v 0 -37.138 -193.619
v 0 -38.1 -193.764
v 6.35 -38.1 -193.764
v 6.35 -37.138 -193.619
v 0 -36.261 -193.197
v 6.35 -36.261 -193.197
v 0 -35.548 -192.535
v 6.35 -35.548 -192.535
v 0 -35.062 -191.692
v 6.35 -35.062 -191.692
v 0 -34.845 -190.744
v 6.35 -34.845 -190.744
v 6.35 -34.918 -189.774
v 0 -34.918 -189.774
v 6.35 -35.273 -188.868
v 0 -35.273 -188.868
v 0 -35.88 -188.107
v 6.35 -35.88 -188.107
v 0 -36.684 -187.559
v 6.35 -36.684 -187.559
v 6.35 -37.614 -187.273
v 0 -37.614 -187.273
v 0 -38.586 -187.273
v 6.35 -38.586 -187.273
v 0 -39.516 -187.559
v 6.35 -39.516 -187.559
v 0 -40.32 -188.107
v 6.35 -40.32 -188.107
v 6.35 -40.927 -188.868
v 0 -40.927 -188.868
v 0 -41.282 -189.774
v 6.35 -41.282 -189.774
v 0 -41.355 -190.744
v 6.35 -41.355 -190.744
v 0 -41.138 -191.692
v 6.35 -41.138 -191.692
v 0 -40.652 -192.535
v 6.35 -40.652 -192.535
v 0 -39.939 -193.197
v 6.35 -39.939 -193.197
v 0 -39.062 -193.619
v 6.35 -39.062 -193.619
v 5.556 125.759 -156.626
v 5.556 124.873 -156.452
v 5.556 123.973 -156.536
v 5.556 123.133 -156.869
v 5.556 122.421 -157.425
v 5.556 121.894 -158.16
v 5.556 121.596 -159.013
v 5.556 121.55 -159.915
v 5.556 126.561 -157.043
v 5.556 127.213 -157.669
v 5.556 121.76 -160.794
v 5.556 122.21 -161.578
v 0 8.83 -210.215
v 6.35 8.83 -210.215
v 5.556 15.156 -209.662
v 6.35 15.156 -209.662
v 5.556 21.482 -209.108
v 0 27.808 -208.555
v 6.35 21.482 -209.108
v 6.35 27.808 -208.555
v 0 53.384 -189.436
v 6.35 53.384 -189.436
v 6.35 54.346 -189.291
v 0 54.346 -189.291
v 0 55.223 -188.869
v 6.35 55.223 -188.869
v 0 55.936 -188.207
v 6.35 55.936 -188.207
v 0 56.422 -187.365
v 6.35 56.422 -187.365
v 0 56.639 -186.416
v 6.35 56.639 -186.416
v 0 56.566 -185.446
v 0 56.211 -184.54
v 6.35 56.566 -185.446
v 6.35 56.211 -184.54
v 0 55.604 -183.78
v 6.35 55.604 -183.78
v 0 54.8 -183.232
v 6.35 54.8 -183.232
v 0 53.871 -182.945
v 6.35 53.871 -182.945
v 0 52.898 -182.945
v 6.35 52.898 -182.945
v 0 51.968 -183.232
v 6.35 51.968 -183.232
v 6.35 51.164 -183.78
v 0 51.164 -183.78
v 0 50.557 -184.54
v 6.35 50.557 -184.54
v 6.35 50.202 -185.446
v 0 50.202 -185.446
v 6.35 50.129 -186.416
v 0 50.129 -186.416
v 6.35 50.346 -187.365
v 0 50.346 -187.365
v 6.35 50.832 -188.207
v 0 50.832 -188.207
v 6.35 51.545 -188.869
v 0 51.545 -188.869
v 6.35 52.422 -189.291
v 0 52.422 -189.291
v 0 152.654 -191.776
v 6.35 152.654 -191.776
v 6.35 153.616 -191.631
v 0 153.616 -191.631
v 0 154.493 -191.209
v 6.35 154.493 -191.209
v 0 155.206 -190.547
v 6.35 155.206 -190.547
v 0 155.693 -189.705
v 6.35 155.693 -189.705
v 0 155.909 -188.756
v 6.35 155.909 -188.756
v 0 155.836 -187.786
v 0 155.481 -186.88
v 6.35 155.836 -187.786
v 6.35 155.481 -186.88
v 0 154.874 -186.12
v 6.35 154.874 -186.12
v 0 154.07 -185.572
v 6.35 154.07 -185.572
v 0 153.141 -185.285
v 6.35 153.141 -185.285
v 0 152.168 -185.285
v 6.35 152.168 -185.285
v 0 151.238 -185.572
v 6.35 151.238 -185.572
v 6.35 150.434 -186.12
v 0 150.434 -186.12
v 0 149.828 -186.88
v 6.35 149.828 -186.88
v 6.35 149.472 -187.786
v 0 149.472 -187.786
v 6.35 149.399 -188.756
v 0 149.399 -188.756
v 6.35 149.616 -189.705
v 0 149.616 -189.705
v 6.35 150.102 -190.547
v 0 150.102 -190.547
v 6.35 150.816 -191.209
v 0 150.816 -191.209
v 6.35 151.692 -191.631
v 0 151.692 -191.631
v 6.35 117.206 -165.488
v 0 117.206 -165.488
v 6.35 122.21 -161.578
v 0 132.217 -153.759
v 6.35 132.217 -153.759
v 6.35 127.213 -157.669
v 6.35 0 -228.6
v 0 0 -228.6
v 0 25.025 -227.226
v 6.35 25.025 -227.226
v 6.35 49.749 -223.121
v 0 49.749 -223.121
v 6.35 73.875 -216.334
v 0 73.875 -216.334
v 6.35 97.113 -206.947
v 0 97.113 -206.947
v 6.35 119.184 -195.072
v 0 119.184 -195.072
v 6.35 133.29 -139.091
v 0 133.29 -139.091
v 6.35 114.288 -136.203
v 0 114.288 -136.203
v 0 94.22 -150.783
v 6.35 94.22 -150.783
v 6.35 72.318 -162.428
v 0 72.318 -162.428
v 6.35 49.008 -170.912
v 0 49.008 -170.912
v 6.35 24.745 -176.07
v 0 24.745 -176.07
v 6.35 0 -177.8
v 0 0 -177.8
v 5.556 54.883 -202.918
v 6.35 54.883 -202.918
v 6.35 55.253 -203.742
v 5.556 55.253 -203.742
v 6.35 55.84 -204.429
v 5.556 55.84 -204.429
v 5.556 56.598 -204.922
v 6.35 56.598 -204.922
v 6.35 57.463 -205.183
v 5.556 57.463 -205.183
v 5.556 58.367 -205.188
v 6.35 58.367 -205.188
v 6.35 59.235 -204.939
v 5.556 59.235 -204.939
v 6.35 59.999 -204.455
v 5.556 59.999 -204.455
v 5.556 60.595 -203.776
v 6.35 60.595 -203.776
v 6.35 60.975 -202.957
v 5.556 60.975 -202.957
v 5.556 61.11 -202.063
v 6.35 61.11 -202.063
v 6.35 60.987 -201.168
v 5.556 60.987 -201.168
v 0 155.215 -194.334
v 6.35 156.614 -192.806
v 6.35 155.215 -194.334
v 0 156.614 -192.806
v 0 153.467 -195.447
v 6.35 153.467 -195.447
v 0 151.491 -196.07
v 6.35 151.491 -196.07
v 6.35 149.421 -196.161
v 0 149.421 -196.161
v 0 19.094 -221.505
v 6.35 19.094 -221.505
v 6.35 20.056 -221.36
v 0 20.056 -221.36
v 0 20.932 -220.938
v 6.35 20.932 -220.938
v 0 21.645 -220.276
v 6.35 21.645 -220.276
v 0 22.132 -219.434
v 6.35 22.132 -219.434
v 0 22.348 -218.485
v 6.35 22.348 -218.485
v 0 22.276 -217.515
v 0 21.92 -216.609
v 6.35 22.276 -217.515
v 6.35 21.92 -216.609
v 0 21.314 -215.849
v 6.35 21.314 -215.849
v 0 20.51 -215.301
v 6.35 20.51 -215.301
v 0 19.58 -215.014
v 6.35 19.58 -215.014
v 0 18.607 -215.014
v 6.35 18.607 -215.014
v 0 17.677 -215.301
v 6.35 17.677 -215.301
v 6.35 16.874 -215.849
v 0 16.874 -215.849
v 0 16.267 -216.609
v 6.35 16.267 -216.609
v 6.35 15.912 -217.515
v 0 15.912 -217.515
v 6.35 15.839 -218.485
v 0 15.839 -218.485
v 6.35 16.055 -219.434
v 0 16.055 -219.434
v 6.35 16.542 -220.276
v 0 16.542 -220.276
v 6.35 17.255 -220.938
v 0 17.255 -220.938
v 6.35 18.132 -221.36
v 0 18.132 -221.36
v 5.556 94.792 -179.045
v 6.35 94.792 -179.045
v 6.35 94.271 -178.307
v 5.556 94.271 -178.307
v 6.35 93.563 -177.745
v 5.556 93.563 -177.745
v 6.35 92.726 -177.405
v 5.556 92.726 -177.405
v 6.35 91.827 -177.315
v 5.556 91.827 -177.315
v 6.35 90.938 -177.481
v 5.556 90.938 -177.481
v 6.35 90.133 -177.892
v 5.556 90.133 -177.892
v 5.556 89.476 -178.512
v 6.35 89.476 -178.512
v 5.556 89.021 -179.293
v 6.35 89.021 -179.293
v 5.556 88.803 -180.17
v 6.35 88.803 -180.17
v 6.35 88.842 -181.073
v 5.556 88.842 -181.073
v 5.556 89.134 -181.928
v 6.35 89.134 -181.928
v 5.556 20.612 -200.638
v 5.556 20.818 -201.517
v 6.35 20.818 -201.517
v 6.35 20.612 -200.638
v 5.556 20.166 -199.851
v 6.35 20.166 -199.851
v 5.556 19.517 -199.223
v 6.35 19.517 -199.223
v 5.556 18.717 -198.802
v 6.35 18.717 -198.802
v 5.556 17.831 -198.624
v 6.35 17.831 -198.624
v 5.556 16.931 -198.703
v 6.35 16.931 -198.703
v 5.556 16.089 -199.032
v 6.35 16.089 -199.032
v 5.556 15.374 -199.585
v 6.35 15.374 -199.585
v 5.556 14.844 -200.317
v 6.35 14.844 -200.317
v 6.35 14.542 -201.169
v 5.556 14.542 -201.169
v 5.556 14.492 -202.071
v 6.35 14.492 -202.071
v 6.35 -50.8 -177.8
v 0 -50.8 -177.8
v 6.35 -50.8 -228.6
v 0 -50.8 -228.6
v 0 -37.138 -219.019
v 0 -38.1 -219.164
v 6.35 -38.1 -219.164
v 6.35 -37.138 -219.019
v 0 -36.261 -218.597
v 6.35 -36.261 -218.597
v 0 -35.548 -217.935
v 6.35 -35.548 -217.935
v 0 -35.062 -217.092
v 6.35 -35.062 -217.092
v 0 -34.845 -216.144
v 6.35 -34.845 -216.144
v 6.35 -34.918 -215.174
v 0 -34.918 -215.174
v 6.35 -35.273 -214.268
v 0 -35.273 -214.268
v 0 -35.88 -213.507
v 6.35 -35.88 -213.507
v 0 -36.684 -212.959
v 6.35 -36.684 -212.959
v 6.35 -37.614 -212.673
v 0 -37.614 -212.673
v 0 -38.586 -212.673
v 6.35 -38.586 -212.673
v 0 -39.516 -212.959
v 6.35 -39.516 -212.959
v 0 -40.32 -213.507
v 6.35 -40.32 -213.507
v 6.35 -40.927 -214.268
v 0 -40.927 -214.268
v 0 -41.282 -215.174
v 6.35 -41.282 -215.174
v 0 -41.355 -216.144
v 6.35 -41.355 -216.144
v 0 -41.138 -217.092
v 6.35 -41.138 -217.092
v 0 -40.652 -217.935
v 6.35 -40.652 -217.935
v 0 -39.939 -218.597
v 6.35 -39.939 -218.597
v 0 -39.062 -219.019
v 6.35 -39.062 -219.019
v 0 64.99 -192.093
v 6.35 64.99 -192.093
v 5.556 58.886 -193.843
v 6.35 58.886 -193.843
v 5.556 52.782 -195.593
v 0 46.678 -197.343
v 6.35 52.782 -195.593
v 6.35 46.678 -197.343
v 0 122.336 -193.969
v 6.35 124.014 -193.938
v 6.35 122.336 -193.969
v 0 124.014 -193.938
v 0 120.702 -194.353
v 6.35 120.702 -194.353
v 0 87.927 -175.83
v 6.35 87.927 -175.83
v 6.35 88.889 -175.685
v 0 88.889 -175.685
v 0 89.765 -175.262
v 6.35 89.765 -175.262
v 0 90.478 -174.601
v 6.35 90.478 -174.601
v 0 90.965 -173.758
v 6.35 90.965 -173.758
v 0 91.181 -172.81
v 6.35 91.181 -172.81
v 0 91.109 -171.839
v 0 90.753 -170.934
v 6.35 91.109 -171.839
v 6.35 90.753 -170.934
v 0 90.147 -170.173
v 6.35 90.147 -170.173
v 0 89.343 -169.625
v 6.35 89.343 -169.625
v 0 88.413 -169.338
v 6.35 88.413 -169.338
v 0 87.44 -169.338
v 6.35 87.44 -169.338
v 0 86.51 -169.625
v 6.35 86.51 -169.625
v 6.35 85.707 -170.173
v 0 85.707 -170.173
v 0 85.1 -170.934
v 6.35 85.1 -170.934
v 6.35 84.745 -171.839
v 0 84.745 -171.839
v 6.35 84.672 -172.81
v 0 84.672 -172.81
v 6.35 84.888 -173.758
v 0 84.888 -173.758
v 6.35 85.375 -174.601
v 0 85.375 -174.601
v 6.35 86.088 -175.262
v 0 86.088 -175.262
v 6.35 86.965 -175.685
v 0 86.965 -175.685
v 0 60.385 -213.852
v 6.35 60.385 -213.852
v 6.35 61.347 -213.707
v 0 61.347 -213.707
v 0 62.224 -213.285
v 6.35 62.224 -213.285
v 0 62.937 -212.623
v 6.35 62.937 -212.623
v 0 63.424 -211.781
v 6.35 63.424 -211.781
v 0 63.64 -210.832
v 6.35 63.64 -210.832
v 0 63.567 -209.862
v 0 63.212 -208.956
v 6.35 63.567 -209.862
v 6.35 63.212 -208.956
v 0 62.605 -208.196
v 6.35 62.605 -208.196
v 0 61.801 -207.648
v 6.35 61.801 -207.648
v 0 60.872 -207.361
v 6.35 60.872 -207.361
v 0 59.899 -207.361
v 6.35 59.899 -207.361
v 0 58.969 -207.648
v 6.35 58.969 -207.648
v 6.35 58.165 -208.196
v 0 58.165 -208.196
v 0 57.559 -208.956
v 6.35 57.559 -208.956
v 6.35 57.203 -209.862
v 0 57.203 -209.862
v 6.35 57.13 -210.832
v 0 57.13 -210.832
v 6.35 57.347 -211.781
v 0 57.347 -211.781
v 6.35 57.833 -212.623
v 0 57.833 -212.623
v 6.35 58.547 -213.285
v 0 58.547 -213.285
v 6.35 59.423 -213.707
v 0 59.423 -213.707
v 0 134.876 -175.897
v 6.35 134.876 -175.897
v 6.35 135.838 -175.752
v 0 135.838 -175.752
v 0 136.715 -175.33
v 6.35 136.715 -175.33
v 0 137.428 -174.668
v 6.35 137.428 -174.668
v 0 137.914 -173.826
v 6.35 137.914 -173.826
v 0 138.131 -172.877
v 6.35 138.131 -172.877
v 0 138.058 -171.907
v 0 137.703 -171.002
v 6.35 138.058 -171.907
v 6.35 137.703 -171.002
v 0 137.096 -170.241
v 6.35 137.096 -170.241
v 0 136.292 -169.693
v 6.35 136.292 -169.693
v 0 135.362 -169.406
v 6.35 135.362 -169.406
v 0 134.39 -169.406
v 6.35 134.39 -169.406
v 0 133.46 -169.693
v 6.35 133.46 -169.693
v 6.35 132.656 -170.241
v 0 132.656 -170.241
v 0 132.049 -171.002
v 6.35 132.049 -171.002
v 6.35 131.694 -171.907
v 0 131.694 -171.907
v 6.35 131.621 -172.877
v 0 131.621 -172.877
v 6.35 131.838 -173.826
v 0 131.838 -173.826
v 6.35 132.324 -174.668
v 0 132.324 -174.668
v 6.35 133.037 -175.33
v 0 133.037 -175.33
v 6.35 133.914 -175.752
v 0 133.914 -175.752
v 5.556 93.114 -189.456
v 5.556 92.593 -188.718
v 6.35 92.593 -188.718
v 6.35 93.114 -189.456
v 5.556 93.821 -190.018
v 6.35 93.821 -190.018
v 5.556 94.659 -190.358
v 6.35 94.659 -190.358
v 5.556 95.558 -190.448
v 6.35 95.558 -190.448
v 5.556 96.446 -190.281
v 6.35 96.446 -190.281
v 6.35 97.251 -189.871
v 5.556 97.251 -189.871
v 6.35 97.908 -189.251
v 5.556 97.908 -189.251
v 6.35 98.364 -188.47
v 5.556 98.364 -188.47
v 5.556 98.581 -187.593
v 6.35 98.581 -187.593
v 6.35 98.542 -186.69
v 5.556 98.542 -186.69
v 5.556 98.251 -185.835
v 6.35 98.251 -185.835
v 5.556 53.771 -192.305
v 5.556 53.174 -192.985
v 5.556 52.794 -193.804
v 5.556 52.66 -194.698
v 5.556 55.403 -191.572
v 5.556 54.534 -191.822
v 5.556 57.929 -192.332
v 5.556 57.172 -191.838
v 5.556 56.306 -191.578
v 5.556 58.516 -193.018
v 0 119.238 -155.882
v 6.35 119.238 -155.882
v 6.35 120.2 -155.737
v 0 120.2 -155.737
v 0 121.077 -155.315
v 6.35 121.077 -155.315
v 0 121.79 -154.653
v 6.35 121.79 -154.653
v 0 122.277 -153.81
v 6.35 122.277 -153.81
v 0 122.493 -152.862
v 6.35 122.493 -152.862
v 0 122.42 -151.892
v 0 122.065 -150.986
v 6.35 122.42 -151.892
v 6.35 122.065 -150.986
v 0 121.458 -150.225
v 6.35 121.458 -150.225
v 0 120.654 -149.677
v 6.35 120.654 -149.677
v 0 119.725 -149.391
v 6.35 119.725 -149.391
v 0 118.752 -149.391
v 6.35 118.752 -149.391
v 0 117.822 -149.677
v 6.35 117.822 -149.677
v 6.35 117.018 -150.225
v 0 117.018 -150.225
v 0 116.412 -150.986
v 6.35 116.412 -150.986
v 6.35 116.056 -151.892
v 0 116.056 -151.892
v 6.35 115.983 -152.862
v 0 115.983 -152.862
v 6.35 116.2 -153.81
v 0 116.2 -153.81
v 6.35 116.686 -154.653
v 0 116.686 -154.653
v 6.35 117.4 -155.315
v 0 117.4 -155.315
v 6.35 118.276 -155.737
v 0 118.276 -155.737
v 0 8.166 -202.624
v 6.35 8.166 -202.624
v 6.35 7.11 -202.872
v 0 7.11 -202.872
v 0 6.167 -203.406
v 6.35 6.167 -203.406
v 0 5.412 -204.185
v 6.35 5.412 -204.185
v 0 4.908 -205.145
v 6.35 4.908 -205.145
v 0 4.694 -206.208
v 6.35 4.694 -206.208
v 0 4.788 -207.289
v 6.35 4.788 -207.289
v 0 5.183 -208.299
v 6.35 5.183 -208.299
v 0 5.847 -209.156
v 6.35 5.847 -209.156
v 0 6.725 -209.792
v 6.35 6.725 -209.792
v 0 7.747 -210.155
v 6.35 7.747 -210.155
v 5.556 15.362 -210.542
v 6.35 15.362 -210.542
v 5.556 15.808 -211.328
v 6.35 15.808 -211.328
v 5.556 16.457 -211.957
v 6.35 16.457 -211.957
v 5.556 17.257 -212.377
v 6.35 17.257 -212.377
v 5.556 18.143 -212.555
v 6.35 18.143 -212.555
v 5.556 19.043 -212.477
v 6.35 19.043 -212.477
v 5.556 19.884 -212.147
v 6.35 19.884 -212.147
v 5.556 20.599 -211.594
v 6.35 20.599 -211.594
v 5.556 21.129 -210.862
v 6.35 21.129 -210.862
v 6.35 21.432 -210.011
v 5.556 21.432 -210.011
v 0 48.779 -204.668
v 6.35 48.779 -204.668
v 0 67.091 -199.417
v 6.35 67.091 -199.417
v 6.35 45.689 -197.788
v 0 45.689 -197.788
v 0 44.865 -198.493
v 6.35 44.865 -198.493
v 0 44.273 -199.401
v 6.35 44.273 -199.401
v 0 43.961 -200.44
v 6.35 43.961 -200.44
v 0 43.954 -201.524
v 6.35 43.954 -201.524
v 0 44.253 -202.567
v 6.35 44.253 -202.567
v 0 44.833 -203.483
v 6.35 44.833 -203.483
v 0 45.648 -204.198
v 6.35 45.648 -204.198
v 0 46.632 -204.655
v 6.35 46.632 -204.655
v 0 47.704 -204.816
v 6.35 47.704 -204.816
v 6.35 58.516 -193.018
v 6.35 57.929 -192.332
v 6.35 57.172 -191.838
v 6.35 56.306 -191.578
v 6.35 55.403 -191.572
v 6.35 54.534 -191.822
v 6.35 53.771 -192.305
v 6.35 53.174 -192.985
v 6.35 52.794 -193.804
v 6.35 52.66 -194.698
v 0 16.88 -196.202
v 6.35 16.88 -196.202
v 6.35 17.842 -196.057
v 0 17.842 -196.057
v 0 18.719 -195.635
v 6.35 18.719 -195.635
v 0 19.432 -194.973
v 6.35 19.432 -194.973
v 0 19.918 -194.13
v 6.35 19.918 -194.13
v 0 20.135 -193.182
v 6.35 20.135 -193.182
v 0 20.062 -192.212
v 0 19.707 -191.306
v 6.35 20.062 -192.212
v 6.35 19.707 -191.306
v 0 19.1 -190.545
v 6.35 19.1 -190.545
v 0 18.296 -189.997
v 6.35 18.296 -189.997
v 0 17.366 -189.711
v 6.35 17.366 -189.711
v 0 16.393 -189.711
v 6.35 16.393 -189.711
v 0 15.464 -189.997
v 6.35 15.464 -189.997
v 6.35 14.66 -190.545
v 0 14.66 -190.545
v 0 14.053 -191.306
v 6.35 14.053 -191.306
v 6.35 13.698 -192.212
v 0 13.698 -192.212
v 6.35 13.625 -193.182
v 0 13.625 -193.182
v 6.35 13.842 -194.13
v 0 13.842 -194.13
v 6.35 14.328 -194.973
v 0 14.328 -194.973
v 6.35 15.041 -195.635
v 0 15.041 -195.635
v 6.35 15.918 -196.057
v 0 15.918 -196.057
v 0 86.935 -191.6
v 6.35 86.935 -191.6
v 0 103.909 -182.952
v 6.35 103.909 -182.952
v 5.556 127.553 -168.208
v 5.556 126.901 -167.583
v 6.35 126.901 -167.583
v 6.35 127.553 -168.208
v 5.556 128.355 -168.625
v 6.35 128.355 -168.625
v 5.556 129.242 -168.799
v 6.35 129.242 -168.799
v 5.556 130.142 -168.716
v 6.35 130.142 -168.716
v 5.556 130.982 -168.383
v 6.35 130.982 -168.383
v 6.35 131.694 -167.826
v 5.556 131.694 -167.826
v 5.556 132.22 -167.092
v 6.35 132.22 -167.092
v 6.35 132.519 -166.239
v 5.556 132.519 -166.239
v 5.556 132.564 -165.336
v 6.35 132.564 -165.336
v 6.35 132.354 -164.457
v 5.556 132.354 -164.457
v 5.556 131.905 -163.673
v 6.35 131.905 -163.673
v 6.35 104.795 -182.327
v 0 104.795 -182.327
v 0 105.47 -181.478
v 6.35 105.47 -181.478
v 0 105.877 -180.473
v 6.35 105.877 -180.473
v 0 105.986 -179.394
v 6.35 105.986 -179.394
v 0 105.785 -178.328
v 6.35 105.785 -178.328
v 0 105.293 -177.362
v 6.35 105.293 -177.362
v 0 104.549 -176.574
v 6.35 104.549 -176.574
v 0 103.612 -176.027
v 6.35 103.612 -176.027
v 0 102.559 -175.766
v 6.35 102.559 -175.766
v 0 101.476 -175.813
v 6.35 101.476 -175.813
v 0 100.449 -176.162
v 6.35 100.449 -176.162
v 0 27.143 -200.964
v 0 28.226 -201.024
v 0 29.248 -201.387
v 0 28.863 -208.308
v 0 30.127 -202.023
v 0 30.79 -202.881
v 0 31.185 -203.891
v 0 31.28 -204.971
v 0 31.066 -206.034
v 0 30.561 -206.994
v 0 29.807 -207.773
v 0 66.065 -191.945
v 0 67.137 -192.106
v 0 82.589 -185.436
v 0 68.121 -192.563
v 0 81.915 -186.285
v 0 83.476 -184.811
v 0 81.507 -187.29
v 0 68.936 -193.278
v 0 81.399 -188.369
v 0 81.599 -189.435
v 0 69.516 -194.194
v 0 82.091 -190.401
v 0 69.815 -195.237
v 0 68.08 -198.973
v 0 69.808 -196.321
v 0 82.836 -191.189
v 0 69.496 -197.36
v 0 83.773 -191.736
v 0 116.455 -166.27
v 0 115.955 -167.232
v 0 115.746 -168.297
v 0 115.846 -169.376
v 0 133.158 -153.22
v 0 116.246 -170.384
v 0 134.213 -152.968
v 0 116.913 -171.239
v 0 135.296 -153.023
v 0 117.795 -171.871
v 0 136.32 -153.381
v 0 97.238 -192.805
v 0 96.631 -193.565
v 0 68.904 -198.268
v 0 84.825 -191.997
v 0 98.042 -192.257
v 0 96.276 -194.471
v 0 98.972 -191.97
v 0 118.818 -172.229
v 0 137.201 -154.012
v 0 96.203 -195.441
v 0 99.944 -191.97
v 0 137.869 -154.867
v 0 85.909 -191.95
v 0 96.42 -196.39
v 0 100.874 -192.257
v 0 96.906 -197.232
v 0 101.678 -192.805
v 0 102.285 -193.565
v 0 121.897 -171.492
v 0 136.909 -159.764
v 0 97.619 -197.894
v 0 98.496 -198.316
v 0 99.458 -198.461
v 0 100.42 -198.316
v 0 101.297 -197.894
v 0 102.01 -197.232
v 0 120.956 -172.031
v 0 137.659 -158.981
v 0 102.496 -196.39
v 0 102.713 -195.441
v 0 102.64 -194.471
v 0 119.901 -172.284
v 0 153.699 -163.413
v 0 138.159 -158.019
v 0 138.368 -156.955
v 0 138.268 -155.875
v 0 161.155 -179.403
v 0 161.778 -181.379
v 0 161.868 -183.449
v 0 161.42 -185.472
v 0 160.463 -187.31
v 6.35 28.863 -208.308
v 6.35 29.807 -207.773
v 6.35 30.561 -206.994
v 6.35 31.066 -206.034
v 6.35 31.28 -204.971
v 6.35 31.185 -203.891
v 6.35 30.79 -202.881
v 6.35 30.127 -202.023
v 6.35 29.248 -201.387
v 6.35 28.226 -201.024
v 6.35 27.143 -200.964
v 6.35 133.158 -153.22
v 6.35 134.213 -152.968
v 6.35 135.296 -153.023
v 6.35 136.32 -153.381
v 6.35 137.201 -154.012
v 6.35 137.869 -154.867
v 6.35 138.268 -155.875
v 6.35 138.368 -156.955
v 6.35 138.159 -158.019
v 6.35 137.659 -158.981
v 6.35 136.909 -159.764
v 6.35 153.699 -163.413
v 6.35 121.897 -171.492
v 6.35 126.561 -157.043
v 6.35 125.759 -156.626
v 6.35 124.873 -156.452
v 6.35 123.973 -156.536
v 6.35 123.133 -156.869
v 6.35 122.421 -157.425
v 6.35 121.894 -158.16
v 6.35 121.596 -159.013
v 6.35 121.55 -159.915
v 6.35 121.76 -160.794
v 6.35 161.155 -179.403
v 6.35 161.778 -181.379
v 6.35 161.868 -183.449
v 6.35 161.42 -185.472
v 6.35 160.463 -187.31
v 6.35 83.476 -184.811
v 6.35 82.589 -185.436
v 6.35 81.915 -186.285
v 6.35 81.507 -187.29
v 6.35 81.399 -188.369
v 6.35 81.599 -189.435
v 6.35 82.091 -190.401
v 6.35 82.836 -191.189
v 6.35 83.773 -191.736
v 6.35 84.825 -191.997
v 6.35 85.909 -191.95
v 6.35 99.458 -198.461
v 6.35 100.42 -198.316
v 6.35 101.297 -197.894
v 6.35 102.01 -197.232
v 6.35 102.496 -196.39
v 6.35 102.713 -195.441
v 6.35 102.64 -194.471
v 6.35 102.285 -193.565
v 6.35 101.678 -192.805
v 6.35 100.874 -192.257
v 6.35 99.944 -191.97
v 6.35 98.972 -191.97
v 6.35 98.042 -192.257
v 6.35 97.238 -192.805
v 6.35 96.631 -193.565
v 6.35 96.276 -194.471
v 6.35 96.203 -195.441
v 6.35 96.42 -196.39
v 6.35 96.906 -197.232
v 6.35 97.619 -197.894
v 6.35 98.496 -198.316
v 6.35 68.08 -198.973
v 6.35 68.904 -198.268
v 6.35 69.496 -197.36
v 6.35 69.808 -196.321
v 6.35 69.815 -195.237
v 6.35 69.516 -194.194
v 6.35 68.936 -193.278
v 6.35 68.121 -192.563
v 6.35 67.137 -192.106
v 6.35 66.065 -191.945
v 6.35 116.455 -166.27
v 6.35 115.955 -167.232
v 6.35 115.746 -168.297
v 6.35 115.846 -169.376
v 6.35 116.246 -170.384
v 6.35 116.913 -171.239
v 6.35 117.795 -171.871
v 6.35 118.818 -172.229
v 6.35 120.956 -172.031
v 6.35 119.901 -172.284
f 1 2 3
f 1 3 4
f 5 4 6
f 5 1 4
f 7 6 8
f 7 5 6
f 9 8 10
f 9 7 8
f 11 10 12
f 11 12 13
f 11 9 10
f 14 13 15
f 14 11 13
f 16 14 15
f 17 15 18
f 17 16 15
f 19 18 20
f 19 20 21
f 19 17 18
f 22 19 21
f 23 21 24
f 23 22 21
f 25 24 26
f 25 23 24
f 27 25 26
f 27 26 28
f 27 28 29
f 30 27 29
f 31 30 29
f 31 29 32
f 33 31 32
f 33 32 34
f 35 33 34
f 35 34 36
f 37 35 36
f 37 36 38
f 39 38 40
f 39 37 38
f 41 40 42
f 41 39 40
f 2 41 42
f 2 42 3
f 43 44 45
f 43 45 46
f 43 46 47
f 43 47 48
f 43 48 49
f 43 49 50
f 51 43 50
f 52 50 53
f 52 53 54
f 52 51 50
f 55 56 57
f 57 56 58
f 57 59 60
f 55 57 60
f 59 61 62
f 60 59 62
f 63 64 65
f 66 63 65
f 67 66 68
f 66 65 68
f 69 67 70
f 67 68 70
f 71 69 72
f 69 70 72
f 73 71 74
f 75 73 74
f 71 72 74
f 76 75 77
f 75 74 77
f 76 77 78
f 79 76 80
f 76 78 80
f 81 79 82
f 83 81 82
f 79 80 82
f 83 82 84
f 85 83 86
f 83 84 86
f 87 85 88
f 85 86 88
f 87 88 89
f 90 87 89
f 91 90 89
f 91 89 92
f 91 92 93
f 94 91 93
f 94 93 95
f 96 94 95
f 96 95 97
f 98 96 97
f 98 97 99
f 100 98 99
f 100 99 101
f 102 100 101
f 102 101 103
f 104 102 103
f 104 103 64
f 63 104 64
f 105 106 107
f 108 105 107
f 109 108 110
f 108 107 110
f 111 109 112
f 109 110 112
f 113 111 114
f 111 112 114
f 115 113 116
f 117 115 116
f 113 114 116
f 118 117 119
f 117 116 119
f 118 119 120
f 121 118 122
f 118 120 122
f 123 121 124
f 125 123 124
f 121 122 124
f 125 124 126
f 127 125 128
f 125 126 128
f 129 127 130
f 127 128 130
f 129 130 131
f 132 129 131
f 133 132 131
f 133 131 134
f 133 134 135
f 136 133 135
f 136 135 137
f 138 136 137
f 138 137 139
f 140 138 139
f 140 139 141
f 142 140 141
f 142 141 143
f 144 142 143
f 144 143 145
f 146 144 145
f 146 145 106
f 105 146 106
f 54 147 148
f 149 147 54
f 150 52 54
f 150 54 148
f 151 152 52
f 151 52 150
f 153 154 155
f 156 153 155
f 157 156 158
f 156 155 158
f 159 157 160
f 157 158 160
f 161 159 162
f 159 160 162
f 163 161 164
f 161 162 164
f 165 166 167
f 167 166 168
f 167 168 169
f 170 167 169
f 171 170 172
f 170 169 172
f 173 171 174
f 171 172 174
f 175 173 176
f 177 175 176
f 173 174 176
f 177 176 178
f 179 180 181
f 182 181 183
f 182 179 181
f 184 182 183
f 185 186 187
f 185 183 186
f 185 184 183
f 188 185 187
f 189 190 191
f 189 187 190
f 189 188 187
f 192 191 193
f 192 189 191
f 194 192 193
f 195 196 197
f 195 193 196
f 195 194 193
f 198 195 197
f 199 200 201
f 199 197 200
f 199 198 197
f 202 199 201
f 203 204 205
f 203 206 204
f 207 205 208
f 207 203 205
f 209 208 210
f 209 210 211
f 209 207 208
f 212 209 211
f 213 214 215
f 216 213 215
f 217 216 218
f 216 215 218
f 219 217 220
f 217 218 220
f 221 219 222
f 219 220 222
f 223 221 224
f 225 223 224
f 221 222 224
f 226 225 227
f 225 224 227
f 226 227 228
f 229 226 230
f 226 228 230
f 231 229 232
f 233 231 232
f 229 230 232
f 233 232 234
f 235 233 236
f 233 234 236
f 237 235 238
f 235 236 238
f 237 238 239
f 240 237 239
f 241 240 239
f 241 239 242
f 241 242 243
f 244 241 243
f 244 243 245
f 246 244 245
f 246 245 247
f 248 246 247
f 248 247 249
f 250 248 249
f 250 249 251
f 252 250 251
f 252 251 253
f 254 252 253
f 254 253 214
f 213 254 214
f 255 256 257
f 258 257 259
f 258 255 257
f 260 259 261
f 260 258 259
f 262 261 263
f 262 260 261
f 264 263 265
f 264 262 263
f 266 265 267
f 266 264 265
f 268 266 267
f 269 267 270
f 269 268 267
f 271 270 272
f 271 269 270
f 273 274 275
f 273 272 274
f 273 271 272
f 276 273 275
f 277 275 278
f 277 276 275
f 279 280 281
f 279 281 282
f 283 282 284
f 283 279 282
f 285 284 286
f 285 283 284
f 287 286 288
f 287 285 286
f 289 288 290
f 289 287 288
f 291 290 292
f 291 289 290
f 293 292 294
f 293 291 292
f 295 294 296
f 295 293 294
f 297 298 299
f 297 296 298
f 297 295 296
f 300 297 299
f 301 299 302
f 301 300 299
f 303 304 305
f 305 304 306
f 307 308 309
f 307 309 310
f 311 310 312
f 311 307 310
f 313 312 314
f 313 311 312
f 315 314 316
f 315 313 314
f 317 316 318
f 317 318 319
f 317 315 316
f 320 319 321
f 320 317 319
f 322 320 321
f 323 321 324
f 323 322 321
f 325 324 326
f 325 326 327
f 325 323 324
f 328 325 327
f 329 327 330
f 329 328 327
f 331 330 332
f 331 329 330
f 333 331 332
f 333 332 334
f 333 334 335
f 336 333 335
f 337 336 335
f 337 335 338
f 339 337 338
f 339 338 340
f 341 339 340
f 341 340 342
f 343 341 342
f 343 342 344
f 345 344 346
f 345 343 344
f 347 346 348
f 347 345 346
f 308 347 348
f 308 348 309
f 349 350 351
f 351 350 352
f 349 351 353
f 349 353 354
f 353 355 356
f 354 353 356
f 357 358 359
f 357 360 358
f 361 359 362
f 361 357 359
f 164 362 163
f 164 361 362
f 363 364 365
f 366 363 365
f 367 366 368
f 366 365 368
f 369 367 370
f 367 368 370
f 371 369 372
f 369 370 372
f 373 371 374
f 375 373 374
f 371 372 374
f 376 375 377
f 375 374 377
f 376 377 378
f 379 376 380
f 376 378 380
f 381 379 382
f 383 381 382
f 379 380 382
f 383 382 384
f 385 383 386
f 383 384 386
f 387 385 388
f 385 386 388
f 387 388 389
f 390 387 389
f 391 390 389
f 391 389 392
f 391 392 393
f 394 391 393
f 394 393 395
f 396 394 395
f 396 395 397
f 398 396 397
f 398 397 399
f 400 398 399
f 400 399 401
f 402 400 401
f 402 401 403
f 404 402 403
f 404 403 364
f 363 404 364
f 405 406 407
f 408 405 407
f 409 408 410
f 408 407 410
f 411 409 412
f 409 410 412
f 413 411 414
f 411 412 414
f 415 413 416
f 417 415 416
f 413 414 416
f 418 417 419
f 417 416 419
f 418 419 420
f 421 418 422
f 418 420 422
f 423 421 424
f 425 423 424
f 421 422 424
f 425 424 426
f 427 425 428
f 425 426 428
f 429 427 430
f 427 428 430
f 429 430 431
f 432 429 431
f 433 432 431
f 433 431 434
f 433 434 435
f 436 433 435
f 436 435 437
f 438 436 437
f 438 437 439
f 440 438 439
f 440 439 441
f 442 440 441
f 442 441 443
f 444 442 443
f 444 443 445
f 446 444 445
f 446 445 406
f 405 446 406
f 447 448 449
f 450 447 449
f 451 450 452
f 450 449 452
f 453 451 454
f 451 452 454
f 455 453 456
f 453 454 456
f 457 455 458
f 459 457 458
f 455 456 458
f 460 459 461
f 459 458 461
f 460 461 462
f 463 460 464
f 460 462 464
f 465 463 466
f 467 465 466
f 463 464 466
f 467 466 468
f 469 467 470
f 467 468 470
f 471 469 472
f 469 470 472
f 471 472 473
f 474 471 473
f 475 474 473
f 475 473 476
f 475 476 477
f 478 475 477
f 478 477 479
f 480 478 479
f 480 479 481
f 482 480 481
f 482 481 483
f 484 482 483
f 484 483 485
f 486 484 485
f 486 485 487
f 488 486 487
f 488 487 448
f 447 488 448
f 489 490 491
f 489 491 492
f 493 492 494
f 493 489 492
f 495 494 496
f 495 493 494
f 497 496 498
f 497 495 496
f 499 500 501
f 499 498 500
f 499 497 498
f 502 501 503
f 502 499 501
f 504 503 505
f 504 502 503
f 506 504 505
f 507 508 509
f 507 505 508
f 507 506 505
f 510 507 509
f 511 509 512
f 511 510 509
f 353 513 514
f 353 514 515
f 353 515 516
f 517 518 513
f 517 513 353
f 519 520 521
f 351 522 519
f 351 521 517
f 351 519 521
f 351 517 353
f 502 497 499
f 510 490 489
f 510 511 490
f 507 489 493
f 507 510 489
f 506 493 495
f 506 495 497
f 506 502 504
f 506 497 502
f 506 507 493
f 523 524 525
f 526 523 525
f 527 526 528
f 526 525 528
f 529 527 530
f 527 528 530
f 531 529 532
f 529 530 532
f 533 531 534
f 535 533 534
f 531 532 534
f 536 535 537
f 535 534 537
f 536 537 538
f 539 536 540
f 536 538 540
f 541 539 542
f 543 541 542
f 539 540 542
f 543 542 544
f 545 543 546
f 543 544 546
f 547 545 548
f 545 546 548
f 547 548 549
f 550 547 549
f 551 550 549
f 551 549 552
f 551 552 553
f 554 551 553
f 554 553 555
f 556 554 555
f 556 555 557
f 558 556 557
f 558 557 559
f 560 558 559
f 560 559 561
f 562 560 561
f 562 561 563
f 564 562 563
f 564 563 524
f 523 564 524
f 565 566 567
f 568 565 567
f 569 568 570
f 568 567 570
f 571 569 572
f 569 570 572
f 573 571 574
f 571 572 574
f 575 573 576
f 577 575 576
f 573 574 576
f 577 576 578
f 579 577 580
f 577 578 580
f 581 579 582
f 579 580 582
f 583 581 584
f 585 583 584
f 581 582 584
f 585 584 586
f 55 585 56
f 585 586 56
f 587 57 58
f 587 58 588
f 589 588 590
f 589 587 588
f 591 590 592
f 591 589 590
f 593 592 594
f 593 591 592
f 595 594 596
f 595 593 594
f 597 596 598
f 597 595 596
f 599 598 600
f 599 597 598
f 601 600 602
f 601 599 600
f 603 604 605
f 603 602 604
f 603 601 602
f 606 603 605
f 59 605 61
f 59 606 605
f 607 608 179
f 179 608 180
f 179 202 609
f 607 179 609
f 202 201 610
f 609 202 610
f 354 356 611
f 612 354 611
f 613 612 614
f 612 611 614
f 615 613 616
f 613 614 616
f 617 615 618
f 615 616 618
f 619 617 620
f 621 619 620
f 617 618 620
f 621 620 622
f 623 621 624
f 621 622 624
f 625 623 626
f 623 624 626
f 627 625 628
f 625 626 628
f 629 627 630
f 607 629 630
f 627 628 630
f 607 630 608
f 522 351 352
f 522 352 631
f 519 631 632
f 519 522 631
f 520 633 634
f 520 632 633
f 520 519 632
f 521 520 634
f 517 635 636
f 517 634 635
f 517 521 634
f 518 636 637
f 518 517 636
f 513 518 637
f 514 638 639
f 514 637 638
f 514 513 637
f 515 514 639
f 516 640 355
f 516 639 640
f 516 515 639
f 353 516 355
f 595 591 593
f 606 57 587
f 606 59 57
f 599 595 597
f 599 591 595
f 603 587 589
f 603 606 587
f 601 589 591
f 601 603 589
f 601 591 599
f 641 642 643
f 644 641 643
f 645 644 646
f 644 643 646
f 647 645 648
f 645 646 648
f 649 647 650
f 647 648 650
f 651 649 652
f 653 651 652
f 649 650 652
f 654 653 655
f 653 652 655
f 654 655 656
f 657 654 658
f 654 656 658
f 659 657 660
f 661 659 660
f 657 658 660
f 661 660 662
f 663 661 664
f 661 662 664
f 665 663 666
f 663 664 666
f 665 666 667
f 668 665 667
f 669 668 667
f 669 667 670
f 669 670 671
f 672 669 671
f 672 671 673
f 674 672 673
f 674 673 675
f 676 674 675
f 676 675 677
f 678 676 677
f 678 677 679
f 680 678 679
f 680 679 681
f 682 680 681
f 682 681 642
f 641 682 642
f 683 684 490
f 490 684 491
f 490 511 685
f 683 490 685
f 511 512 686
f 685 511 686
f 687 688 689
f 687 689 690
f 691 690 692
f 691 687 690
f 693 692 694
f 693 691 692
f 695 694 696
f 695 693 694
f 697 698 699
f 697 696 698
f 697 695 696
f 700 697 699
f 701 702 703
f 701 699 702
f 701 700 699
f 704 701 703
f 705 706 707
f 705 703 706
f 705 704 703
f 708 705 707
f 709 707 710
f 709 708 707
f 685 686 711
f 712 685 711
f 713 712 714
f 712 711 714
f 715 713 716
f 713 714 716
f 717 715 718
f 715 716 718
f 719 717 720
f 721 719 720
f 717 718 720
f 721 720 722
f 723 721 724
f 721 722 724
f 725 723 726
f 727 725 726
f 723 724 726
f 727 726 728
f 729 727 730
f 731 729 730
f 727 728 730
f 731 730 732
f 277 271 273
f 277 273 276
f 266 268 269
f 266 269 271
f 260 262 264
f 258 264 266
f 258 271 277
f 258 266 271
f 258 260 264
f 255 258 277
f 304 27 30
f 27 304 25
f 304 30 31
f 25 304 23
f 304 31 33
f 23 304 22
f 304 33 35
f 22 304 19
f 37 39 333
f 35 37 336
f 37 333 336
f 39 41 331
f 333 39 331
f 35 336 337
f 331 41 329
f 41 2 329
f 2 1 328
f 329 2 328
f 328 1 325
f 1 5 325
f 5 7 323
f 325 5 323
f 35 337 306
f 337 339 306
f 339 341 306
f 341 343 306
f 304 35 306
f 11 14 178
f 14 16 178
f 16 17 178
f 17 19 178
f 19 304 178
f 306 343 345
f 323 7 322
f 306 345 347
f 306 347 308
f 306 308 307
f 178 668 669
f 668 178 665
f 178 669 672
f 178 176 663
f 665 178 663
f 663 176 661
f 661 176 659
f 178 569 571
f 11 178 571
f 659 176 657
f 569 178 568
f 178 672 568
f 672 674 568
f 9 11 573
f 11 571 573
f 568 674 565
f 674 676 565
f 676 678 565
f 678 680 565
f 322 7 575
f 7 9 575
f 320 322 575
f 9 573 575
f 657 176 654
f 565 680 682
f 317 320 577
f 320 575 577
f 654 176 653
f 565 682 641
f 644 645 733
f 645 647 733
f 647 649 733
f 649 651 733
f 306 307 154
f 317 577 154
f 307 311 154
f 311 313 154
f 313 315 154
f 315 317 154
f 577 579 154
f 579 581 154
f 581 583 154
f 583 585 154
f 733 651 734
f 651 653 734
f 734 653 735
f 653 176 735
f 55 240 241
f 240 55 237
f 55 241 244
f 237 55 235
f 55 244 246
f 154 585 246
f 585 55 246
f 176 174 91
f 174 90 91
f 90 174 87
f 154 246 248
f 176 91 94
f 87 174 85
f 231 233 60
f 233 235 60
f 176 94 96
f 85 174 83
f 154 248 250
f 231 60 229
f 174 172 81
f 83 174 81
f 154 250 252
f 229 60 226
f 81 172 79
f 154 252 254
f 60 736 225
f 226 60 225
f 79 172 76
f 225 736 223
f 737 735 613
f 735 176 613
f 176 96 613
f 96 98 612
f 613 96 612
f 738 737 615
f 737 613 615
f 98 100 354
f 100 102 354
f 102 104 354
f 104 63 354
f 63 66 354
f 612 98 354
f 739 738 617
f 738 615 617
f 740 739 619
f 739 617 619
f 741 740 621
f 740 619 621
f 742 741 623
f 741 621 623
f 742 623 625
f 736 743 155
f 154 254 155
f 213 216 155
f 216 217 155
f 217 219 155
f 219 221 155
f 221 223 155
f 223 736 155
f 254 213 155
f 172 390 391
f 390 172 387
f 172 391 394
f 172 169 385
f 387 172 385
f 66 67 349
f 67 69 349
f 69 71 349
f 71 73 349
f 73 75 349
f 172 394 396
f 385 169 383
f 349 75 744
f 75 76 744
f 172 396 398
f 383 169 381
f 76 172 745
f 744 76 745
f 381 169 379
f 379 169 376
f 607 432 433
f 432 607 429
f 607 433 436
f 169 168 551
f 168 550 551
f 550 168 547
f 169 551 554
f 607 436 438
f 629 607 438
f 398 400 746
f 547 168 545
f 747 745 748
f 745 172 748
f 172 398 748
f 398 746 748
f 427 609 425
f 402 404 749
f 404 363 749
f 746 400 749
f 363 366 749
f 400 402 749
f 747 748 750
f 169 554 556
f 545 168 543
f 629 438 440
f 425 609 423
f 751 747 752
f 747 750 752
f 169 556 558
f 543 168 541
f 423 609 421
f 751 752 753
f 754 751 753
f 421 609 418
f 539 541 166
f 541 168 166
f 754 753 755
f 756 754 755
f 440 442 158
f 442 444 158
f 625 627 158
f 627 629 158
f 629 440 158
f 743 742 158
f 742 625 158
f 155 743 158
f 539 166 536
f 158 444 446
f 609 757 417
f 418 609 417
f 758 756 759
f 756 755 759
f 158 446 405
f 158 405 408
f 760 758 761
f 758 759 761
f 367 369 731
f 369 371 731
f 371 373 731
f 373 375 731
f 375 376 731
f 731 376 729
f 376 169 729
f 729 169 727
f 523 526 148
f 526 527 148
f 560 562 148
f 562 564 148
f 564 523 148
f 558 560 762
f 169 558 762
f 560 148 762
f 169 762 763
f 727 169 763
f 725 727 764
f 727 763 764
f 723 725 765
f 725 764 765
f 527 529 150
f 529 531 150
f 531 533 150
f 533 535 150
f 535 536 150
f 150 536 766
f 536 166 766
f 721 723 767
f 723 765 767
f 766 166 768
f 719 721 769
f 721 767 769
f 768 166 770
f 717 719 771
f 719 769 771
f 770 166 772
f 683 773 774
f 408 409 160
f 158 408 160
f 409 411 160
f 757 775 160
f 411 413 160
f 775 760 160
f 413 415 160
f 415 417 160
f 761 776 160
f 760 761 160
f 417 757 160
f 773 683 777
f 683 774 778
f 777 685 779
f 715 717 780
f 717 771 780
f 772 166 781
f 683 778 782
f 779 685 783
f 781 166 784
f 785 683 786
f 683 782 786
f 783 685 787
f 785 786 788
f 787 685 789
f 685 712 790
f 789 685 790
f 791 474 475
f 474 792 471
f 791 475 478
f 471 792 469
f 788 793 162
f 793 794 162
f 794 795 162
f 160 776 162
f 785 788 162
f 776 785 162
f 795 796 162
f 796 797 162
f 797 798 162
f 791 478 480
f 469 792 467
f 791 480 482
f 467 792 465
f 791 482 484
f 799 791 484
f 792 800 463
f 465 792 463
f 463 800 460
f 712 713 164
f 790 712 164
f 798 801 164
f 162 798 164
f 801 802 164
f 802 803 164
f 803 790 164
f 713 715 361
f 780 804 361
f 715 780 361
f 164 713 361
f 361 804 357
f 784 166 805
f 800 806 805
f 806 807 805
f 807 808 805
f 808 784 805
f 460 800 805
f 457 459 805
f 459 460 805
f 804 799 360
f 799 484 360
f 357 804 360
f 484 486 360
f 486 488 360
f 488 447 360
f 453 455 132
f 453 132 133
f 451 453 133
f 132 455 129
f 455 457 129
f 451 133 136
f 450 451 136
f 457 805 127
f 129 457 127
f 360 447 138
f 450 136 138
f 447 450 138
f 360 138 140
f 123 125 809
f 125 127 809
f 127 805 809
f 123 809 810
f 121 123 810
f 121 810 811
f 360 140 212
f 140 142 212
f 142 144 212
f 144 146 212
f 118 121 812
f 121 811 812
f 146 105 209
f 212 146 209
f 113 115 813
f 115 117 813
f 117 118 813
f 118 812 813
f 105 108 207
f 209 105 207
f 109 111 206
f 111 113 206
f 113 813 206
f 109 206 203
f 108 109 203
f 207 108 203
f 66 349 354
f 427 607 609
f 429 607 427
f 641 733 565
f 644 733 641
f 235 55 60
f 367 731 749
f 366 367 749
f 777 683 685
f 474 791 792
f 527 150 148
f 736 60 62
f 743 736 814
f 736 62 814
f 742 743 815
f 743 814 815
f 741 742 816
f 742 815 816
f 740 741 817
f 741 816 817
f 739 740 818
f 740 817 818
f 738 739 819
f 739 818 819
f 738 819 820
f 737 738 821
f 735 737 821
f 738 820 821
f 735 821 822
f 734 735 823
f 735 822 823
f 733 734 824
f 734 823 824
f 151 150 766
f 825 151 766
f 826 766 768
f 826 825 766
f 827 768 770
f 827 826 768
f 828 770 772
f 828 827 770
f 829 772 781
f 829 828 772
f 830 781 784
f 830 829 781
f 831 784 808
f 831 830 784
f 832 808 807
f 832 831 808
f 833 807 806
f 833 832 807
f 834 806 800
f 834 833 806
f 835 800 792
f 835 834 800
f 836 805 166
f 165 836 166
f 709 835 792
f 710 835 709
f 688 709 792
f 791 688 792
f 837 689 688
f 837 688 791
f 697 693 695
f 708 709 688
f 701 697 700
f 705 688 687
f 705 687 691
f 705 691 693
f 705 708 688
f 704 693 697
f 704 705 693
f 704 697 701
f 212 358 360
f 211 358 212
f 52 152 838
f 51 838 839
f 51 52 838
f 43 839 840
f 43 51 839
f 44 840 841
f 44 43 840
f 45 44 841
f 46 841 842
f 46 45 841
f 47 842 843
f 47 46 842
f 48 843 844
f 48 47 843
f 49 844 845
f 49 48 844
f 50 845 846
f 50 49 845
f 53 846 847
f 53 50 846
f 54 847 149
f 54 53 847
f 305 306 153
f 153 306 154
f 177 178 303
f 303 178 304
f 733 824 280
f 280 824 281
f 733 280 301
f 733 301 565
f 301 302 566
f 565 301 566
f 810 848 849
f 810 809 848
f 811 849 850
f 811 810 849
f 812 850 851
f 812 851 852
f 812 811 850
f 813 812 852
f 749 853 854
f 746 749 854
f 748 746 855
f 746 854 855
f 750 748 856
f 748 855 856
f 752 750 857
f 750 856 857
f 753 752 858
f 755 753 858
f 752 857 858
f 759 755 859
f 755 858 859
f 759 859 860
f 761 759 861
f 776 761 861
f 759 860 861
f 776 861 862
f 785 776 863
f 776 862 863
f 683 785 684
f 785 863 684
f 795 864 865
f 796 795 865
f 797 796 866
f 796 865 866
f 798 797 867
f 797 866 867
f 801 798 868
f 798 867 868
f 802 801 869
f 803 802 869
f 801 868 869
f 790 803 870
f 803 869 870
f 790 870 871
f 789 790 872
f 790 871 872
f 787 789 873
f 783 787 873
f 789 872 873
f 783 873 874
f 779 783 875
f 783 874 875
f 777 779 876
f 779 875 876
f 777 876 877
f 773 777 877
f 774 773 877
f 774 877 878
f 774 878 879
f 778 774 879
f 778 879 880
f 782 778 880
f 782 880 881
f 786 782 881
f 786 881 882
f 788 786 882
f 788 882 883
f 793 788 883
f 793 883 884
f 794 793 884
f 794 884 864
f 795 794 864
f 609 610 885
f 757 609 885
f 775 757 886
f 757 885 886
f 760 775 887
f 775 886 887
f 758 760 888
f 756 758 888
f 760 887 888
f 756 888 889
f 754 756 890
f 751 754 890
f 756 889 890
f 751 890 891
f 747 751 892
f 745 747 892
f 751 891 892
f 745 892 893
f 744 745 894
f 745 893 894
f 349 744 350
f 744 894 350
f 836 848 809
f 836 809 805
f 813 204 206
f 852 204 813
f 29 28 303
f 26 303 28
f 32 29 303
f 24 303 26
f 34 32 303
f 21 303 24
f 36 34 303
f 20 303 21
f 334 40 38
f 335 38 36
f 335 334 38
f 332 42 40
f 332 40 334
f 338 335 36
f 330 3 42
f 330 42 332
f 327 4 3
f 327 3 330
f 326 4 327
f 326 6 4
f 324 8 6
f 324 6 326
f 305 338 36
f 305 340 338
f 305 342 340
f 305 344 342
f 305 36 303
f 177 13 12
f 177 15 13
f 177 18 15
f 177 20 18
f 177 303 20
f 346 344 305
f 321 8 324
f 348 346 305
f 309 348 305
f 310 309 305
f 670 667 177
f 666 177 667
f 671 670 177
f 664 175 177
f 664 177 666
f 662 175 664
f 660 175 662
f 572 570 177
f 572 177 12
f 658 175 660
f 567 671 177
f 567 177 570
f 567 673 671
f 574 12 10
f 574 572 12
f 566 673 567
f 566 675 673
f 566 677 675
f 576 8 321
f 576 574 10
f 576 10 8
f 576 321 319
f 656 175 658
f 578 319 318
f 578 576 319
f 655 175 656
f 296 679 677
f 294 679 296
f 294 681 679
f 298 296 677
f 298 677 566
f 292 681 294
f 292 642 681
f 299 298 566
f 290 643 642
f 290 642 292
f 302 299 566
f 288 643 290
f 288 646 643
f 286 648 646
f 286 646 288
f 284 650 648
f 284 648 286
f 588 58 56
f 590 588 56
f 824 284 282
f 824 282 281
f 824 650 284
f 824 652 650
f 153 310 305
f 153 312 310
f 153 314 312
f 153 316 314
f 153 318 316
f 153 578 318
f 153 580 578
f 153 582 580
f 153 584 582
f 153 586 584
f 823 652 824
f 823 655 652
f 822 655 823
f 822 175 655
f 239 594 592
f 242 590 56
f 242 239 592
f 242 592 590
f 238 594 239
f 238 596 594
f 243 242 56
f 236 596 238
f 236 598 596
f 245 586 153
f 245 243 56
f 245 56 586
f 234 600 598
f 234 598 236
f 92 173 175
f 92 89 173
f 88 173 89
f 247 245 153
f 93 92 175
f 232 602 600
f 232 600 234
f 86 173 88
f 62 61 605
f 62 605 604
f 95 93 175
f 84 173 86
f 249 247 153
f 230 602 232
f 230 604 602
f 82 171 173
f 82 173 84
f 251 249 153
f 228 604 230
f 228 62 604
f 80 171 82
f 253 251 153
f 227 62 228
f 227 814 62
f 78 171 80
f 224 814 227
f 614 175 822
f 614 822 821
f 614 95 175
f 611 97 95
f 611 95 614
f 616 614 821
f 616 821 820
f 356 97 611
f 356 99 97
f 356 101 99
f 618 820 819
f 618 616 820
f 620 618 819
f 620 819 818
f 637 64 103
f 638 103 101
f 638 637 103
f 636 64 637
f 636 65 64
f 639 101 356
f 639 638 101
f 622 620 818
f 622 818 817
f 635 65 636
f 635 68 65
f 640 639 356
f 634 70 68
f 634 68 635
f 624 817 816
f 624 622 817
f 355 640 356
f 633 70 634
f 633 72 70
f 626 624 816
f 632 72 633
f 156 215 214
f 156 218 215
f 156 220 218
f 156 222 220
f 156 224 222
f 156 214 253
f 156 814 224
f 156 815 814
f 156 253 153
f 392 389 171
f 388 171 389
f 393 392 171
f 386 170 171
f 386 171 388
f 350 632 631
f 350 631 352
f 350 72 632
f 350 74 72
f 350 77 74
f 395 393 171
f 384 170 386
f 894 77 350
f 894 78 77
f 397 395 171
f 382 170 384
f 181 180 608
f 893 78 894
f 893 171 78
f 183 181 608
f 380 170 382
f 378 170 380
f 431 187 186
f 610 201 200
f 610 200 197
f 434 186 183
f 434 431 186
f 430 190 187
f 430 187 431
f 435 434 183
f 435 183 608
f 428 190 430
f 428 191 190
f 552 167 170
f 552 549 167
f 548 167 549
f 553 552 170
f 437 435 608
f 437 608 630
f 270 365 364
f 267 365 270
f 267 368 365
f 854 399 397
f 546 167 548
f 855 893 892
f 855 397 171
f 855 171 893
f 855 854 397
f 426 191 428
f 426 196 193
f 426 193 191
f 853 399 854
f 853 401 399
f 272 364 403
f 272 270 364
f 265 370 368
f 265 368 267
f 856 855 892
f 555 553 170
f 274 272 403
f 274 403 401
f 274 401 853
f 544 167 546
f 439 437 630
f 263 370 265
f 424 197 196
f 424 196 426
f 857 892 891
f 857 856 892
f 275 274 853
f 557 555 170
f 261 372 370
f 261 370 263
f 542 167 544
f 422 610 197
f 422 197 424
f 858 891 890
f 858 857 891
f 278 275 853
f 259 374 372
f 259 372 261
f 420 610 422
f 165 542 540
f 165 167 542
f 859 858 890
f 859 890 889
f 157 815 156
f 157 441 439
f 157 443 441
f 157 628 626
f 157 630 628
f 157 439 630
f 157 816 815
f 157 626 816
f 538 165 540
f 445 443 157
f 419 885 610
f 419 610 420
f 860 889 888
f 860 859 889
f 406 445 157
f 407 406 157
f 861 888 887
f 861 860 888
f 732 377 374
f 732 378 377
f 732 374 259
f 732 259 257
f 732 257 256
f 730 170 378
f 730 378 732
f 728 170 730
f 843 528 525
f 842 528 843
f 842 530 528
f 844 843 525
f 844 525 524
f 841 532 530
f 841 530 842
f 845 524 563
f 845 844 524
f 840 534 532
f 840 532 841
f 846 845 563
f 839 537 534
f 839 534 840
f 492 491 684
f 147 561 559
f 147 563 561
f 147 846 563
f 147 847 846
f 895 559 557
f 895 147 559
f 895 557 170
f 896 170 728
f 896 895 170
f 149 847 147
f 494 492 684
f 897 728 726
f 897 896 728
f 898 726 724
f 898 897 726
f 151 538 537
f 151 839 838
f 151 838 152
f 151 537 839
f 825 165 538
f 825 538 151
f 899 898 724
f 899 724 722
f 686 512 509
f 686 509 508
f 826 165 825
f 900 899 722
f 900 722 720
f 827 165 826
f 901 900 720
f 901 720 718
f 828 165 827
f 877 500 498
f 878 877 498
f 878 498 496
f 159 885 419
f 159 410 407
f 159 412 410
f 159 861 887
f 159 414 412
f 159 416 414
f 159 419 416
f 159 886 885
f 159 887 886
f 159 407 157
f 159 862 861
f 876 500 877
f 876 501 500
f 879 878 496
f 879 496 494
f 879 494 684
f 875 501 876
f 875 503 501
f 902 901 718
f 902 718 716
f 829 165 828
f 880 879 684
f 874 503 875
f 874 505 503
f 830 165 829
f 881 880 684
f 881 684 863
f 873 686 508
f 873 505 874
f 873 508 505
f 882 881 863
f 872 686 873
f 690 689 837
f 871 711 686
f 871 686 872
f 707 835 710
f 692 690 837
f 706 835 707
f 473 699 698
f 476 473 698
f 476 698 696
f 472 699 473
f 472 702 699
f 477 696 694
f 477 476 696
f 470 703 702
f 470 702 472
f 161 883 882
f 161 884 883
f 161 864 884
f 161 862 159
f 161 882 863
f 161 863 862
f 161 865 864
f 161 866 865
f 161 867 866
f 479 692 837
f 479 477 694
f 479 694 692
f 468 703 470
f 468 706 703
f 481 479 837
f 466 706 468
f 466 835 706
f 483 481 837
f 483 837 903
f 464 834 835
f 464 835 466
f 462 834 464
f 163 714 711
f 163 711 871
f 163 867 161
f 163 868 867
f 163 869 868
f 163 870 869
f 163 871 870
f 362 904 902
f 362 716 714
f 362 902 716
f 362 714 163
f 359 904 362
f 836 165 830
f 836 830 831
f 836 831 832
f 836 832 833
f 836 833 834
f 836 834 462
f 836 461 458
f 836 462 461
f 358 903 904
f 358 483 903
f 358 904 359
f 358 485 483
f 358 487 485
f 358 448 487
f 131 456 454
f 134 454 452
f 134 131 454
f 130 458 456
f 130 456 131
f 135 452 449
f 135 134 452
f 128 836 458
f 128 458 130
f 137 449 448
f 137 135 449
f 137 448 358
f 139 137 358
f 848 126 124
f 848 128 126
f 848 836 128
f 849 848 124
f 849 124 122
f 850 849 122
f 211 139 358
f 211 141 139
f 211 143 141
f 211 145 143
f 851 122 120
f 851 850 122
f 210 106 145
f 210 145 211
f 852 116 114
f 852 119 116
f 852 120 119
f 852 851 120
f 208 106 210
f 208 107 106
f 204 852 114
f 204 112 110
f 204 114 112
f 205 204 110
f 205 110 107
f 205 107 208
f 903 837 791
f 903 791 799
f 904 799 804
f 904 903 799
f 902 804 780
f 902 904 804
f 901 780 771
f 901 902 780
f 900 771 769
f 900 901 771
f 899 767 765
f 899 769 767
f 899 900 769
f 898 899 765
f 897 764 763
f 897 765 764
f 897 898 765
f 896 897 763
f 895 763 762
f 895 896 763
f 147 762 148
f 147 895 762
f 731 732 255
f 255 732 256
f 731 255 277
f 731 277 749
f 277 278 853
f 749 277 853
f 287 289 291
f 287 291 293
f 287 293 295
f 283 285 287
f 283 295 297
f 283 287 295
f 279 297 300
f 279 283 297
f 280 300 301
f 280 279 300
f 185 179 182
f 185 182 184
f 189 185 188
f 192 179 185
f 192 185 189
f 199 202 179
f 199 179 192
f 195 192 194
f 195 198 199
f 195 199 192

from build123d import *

# Parameters (mm, degrees)
SKETCH1_R               = 3.2639
BOSS_EXTRUDE1_DEPTH     = 6.35
SKETCH6_R               = 3.2639
CUT_EXTRUDE1_DEPTH      = 7.35
CUT_EXTRUDE2_START      = -0.79375
CUT_EXTRUDE2_DEPTH      = 10.82675
CIRPATTERN1_COUNT       = 4
CIRPATTERN1_ANGLE       = 33
BOSS_EXTRUDE2_DEPTH     = 6.35
SKETCH9_R               = 3.2639
CUT_EXTRUDE3_DEPTH      = 1
CUT_EXTRUDE3_DEPTH_BACK = 7.35
FILLET2_R               = 7.9375


with BuildPart() as part:
    # Sketch1 → Boss-Extrude1 (new body)
    with BuildSketch(Plane(origin=(0, 0, 0), x_dir=(0, 0, -1), z_dir=(1, 0, 0))):
        with BuildLine():
            Line((177.8, 0), (177.8, -50.8))
            Line((177.8, -50.8), (228.6, -50.8))
            Line((228.6, -50.8), (228.6, 0))
            ThreePointArc((228.6, 0), (214.813733112, 78.185804764), (175.117759697, 146.941247574))
            Line((175.117759697, 146.941247574), (163.413376386, 153.69877643))
            Line((163.413376386, 153.69877643), (139.091465317, 133.290269822))
            Line((139.091465317, 133.290269822), (136.202701987, 114.287637002))
            ThreePointArc((136.202701987, 114.287637002), (167.077347976, 60.811181483), (177.8, 0))
        make_face()
        with Locations((190.5, -38.1)):
            Circle(SKETCH1_R, mode=Mode.SUBTRACT)
        with Locations((215.9, -38.1)):
            Circle(SKETCH1_R, mode=Mode.SUBTRACT)
    extrude(amount=BOSS_EXTRUDE1_DEPTH)

    # Sketch6 → Cut-Extrude1 (cut, through all)
    with BuildSketch(Plane(origin=(6.35, 0, 0), x_dir=(0, 0, -1), z_dir=(1, 0, 0))):
        with Locations((192.938008153, 16.879888477)):
            Circle(SKETCH6_R)
        with Locations((218.241353484, 19.093644342)):
            Circle(SKETCH6_R)
        with Locations((186.172358961, 53.384064888)):
            Circle(SKETCH6_R)
        with Locations((210.588406038, 60.385253726)):
            Circle(SKETCH6_R)
        with Locations((172.565688572, 87.926610037)):
            Circle(SKETCH6_R)
        with Locations((195.197254287, 99.45796873)):
            Circle(SKETCH6_R)
        with Locations((152.617982705, 119.238236234)):
            Circle(SKETCH6_R)
        with Locations((172.633455846, 134.876037707)):
            Circle(SKETCH6_R)
        with BuildLine():
            Line((192.092529624, 64.990498635), (197.343421252, 46.678463327))
            ThreePointArc((197.343421252, 46.678463327), (202.056006639, 44.066234591), (204.668235375, 48.778819979))
            Line((204.668235375, 48.778819979), (199.417343747, 67.090855286))
            ThreePointArc((199.417343747, 67.090855286), (194.704758359, 69.703084022), (192.092529624, 64.990498635))
        make_face()
        with BuildLine():
            Line((176.162477062, 100.449422723), (184.810996082, 83.475748437))
            ThreePointArc((184.810996082, 83.475748437), (189.935434743, 81.810717384), (191.600465797, 86.935156045))
            Line((191.600465797, 86.935156045), (182.951946777, 103.908830331))
            ThreePointArc((182.951946777, 103.908830331), (177.827508115, 105.573861384), (176.162477062, 100.449422723))
        make_face()
        with BuildLine():
            Line((200.964020569, 27.143457529), (202.624337469, 8.16594853))
            ThreePointArc((202.624337469, 8.16594853), (206.751902648, 4.70251011), (210.215341068, 8.83007529))
            Line((210.215341068, 8.83007529), (208.555024169, 27.807584289))
            ThreePointArc((208.555024169, 27.807584289), (204.427458989, 31.271022709), (200.964020569, 27.143457529))
        make_face()
        with BuildLine():
            Line((159.763864694, 136.908609619), (171.492215799, 121.897004763))
            ThreePointArc((171.492215799, 121.897004763), (170.835565049, 116.549013571), (165.487573857, 117.205664321))
            Line((165.487573857, 117.205664321), (153.759222752, 132.217269177))
            ThreePointArc((153.759222752, 132.217269177), (154.415873502, 137.56526037), (159.763864694, 136.908609619))
        make_face()
    extrude(amount=-CUT_EXTRUDE1_DEPTH, mode=Mode.SUBTRACT)

    # Sketch8 → Cut-Extrude2 (cut)
    with BuildSketch(Plane(origin=(6.35, 15.551634957, -177.756000954), x_dir=(0, 0.087155743, -0.996194698), z_dir=(1, 0, 0)).offset(CUT_EXTRUDE2_START)):
        with BuildLine():
            Line((31.75, 3.175), (24.13, 3.175))
            ThreePointArc((24.13, 3.175), (20.955, 0), (24.13, -3.175))
            Line((24.13, -3.175), (31.75, -3.175))
            ThreePointArc((31.75, -3.175), (34.925, 0), (31.75, 3.175))
        make_face()
    cut_extrude2 = extrude(amount=CUT_EXTRUDE2_DEPTH, mode=Mode.SUBTRACT)

    # CirPattern1: Cut-Extrude2 ×4 about axis
    cirpattern1_axis = Axis((0, 0, 0), (1, 0, 0))
    for i in range(1, CIRPATTERN1_COUNT):
        add(cut_extrude2.rotate(cirpattern1_axis, i * CIRPATTERN1_ANGLE / (CIRPATTERN1_COUNT - 1)), mode=Mode.SUBTRACT)

    # Sketch11 → Boss-Extrude2 (add)
    with BuildSketch(Plane(origin=(6.35, 0, 0), x_dir=(0, 0, -1), z_dir=(1, 0, 0))):
        with BuildLine():
            Line((183.556066953, 163.091467297), (163.413376386, 153.69877643))
            Line((163.413376386, 153.69877643), (175.117759697, 146.941247574))
            ThreePointArc((175.117759697, 146.941247574), (184.855029121, 134.486349525), (193.708175574, 121.388231372))
            Line((193.708175574, 121.388231372), (196.560105656, 153.98594137))
            Line((196.560105656, 153.98594137), (183.556066953, 163.091467297))
        make_face()
    extrude(amount=-BOSS_EXTRUDE2_DEPTH)

    # Sketch9 → Cut-Extrude3 (cut, two sides)
    with BuildSketch(Plane(origin=(6.35, 0, 0), x_dir=(0, 0, -1), z_dir=(1, 0, 0))) as cut_extrude3_sk:
        with Locations((188.512295871, 152.654247257)):
            Circle(SKETCH9_R)
    extrude(amount=CUT_EXTRUDE3_DEPTH, mode=Mode.SUBTRACT)
    extrude(cut_extrude3_sk.sketch, amount=-CUT_EXTRUDE3_DEPTH_BACK, mode=Mode.SUBTRACT)

    # Fillet2
    fillet2_edges = [part.edges().sort_by_distance(p)[0] for p in [
        (3.175, 153.98594137, -196.560105656),
        (3.175, 121.388231372, -193.708175574),
        (3.175, 163.091467297, -183.556066953),
    ]]
    fillet(fillet2_edges, radius=FILLET2_R)


solid = part.part
